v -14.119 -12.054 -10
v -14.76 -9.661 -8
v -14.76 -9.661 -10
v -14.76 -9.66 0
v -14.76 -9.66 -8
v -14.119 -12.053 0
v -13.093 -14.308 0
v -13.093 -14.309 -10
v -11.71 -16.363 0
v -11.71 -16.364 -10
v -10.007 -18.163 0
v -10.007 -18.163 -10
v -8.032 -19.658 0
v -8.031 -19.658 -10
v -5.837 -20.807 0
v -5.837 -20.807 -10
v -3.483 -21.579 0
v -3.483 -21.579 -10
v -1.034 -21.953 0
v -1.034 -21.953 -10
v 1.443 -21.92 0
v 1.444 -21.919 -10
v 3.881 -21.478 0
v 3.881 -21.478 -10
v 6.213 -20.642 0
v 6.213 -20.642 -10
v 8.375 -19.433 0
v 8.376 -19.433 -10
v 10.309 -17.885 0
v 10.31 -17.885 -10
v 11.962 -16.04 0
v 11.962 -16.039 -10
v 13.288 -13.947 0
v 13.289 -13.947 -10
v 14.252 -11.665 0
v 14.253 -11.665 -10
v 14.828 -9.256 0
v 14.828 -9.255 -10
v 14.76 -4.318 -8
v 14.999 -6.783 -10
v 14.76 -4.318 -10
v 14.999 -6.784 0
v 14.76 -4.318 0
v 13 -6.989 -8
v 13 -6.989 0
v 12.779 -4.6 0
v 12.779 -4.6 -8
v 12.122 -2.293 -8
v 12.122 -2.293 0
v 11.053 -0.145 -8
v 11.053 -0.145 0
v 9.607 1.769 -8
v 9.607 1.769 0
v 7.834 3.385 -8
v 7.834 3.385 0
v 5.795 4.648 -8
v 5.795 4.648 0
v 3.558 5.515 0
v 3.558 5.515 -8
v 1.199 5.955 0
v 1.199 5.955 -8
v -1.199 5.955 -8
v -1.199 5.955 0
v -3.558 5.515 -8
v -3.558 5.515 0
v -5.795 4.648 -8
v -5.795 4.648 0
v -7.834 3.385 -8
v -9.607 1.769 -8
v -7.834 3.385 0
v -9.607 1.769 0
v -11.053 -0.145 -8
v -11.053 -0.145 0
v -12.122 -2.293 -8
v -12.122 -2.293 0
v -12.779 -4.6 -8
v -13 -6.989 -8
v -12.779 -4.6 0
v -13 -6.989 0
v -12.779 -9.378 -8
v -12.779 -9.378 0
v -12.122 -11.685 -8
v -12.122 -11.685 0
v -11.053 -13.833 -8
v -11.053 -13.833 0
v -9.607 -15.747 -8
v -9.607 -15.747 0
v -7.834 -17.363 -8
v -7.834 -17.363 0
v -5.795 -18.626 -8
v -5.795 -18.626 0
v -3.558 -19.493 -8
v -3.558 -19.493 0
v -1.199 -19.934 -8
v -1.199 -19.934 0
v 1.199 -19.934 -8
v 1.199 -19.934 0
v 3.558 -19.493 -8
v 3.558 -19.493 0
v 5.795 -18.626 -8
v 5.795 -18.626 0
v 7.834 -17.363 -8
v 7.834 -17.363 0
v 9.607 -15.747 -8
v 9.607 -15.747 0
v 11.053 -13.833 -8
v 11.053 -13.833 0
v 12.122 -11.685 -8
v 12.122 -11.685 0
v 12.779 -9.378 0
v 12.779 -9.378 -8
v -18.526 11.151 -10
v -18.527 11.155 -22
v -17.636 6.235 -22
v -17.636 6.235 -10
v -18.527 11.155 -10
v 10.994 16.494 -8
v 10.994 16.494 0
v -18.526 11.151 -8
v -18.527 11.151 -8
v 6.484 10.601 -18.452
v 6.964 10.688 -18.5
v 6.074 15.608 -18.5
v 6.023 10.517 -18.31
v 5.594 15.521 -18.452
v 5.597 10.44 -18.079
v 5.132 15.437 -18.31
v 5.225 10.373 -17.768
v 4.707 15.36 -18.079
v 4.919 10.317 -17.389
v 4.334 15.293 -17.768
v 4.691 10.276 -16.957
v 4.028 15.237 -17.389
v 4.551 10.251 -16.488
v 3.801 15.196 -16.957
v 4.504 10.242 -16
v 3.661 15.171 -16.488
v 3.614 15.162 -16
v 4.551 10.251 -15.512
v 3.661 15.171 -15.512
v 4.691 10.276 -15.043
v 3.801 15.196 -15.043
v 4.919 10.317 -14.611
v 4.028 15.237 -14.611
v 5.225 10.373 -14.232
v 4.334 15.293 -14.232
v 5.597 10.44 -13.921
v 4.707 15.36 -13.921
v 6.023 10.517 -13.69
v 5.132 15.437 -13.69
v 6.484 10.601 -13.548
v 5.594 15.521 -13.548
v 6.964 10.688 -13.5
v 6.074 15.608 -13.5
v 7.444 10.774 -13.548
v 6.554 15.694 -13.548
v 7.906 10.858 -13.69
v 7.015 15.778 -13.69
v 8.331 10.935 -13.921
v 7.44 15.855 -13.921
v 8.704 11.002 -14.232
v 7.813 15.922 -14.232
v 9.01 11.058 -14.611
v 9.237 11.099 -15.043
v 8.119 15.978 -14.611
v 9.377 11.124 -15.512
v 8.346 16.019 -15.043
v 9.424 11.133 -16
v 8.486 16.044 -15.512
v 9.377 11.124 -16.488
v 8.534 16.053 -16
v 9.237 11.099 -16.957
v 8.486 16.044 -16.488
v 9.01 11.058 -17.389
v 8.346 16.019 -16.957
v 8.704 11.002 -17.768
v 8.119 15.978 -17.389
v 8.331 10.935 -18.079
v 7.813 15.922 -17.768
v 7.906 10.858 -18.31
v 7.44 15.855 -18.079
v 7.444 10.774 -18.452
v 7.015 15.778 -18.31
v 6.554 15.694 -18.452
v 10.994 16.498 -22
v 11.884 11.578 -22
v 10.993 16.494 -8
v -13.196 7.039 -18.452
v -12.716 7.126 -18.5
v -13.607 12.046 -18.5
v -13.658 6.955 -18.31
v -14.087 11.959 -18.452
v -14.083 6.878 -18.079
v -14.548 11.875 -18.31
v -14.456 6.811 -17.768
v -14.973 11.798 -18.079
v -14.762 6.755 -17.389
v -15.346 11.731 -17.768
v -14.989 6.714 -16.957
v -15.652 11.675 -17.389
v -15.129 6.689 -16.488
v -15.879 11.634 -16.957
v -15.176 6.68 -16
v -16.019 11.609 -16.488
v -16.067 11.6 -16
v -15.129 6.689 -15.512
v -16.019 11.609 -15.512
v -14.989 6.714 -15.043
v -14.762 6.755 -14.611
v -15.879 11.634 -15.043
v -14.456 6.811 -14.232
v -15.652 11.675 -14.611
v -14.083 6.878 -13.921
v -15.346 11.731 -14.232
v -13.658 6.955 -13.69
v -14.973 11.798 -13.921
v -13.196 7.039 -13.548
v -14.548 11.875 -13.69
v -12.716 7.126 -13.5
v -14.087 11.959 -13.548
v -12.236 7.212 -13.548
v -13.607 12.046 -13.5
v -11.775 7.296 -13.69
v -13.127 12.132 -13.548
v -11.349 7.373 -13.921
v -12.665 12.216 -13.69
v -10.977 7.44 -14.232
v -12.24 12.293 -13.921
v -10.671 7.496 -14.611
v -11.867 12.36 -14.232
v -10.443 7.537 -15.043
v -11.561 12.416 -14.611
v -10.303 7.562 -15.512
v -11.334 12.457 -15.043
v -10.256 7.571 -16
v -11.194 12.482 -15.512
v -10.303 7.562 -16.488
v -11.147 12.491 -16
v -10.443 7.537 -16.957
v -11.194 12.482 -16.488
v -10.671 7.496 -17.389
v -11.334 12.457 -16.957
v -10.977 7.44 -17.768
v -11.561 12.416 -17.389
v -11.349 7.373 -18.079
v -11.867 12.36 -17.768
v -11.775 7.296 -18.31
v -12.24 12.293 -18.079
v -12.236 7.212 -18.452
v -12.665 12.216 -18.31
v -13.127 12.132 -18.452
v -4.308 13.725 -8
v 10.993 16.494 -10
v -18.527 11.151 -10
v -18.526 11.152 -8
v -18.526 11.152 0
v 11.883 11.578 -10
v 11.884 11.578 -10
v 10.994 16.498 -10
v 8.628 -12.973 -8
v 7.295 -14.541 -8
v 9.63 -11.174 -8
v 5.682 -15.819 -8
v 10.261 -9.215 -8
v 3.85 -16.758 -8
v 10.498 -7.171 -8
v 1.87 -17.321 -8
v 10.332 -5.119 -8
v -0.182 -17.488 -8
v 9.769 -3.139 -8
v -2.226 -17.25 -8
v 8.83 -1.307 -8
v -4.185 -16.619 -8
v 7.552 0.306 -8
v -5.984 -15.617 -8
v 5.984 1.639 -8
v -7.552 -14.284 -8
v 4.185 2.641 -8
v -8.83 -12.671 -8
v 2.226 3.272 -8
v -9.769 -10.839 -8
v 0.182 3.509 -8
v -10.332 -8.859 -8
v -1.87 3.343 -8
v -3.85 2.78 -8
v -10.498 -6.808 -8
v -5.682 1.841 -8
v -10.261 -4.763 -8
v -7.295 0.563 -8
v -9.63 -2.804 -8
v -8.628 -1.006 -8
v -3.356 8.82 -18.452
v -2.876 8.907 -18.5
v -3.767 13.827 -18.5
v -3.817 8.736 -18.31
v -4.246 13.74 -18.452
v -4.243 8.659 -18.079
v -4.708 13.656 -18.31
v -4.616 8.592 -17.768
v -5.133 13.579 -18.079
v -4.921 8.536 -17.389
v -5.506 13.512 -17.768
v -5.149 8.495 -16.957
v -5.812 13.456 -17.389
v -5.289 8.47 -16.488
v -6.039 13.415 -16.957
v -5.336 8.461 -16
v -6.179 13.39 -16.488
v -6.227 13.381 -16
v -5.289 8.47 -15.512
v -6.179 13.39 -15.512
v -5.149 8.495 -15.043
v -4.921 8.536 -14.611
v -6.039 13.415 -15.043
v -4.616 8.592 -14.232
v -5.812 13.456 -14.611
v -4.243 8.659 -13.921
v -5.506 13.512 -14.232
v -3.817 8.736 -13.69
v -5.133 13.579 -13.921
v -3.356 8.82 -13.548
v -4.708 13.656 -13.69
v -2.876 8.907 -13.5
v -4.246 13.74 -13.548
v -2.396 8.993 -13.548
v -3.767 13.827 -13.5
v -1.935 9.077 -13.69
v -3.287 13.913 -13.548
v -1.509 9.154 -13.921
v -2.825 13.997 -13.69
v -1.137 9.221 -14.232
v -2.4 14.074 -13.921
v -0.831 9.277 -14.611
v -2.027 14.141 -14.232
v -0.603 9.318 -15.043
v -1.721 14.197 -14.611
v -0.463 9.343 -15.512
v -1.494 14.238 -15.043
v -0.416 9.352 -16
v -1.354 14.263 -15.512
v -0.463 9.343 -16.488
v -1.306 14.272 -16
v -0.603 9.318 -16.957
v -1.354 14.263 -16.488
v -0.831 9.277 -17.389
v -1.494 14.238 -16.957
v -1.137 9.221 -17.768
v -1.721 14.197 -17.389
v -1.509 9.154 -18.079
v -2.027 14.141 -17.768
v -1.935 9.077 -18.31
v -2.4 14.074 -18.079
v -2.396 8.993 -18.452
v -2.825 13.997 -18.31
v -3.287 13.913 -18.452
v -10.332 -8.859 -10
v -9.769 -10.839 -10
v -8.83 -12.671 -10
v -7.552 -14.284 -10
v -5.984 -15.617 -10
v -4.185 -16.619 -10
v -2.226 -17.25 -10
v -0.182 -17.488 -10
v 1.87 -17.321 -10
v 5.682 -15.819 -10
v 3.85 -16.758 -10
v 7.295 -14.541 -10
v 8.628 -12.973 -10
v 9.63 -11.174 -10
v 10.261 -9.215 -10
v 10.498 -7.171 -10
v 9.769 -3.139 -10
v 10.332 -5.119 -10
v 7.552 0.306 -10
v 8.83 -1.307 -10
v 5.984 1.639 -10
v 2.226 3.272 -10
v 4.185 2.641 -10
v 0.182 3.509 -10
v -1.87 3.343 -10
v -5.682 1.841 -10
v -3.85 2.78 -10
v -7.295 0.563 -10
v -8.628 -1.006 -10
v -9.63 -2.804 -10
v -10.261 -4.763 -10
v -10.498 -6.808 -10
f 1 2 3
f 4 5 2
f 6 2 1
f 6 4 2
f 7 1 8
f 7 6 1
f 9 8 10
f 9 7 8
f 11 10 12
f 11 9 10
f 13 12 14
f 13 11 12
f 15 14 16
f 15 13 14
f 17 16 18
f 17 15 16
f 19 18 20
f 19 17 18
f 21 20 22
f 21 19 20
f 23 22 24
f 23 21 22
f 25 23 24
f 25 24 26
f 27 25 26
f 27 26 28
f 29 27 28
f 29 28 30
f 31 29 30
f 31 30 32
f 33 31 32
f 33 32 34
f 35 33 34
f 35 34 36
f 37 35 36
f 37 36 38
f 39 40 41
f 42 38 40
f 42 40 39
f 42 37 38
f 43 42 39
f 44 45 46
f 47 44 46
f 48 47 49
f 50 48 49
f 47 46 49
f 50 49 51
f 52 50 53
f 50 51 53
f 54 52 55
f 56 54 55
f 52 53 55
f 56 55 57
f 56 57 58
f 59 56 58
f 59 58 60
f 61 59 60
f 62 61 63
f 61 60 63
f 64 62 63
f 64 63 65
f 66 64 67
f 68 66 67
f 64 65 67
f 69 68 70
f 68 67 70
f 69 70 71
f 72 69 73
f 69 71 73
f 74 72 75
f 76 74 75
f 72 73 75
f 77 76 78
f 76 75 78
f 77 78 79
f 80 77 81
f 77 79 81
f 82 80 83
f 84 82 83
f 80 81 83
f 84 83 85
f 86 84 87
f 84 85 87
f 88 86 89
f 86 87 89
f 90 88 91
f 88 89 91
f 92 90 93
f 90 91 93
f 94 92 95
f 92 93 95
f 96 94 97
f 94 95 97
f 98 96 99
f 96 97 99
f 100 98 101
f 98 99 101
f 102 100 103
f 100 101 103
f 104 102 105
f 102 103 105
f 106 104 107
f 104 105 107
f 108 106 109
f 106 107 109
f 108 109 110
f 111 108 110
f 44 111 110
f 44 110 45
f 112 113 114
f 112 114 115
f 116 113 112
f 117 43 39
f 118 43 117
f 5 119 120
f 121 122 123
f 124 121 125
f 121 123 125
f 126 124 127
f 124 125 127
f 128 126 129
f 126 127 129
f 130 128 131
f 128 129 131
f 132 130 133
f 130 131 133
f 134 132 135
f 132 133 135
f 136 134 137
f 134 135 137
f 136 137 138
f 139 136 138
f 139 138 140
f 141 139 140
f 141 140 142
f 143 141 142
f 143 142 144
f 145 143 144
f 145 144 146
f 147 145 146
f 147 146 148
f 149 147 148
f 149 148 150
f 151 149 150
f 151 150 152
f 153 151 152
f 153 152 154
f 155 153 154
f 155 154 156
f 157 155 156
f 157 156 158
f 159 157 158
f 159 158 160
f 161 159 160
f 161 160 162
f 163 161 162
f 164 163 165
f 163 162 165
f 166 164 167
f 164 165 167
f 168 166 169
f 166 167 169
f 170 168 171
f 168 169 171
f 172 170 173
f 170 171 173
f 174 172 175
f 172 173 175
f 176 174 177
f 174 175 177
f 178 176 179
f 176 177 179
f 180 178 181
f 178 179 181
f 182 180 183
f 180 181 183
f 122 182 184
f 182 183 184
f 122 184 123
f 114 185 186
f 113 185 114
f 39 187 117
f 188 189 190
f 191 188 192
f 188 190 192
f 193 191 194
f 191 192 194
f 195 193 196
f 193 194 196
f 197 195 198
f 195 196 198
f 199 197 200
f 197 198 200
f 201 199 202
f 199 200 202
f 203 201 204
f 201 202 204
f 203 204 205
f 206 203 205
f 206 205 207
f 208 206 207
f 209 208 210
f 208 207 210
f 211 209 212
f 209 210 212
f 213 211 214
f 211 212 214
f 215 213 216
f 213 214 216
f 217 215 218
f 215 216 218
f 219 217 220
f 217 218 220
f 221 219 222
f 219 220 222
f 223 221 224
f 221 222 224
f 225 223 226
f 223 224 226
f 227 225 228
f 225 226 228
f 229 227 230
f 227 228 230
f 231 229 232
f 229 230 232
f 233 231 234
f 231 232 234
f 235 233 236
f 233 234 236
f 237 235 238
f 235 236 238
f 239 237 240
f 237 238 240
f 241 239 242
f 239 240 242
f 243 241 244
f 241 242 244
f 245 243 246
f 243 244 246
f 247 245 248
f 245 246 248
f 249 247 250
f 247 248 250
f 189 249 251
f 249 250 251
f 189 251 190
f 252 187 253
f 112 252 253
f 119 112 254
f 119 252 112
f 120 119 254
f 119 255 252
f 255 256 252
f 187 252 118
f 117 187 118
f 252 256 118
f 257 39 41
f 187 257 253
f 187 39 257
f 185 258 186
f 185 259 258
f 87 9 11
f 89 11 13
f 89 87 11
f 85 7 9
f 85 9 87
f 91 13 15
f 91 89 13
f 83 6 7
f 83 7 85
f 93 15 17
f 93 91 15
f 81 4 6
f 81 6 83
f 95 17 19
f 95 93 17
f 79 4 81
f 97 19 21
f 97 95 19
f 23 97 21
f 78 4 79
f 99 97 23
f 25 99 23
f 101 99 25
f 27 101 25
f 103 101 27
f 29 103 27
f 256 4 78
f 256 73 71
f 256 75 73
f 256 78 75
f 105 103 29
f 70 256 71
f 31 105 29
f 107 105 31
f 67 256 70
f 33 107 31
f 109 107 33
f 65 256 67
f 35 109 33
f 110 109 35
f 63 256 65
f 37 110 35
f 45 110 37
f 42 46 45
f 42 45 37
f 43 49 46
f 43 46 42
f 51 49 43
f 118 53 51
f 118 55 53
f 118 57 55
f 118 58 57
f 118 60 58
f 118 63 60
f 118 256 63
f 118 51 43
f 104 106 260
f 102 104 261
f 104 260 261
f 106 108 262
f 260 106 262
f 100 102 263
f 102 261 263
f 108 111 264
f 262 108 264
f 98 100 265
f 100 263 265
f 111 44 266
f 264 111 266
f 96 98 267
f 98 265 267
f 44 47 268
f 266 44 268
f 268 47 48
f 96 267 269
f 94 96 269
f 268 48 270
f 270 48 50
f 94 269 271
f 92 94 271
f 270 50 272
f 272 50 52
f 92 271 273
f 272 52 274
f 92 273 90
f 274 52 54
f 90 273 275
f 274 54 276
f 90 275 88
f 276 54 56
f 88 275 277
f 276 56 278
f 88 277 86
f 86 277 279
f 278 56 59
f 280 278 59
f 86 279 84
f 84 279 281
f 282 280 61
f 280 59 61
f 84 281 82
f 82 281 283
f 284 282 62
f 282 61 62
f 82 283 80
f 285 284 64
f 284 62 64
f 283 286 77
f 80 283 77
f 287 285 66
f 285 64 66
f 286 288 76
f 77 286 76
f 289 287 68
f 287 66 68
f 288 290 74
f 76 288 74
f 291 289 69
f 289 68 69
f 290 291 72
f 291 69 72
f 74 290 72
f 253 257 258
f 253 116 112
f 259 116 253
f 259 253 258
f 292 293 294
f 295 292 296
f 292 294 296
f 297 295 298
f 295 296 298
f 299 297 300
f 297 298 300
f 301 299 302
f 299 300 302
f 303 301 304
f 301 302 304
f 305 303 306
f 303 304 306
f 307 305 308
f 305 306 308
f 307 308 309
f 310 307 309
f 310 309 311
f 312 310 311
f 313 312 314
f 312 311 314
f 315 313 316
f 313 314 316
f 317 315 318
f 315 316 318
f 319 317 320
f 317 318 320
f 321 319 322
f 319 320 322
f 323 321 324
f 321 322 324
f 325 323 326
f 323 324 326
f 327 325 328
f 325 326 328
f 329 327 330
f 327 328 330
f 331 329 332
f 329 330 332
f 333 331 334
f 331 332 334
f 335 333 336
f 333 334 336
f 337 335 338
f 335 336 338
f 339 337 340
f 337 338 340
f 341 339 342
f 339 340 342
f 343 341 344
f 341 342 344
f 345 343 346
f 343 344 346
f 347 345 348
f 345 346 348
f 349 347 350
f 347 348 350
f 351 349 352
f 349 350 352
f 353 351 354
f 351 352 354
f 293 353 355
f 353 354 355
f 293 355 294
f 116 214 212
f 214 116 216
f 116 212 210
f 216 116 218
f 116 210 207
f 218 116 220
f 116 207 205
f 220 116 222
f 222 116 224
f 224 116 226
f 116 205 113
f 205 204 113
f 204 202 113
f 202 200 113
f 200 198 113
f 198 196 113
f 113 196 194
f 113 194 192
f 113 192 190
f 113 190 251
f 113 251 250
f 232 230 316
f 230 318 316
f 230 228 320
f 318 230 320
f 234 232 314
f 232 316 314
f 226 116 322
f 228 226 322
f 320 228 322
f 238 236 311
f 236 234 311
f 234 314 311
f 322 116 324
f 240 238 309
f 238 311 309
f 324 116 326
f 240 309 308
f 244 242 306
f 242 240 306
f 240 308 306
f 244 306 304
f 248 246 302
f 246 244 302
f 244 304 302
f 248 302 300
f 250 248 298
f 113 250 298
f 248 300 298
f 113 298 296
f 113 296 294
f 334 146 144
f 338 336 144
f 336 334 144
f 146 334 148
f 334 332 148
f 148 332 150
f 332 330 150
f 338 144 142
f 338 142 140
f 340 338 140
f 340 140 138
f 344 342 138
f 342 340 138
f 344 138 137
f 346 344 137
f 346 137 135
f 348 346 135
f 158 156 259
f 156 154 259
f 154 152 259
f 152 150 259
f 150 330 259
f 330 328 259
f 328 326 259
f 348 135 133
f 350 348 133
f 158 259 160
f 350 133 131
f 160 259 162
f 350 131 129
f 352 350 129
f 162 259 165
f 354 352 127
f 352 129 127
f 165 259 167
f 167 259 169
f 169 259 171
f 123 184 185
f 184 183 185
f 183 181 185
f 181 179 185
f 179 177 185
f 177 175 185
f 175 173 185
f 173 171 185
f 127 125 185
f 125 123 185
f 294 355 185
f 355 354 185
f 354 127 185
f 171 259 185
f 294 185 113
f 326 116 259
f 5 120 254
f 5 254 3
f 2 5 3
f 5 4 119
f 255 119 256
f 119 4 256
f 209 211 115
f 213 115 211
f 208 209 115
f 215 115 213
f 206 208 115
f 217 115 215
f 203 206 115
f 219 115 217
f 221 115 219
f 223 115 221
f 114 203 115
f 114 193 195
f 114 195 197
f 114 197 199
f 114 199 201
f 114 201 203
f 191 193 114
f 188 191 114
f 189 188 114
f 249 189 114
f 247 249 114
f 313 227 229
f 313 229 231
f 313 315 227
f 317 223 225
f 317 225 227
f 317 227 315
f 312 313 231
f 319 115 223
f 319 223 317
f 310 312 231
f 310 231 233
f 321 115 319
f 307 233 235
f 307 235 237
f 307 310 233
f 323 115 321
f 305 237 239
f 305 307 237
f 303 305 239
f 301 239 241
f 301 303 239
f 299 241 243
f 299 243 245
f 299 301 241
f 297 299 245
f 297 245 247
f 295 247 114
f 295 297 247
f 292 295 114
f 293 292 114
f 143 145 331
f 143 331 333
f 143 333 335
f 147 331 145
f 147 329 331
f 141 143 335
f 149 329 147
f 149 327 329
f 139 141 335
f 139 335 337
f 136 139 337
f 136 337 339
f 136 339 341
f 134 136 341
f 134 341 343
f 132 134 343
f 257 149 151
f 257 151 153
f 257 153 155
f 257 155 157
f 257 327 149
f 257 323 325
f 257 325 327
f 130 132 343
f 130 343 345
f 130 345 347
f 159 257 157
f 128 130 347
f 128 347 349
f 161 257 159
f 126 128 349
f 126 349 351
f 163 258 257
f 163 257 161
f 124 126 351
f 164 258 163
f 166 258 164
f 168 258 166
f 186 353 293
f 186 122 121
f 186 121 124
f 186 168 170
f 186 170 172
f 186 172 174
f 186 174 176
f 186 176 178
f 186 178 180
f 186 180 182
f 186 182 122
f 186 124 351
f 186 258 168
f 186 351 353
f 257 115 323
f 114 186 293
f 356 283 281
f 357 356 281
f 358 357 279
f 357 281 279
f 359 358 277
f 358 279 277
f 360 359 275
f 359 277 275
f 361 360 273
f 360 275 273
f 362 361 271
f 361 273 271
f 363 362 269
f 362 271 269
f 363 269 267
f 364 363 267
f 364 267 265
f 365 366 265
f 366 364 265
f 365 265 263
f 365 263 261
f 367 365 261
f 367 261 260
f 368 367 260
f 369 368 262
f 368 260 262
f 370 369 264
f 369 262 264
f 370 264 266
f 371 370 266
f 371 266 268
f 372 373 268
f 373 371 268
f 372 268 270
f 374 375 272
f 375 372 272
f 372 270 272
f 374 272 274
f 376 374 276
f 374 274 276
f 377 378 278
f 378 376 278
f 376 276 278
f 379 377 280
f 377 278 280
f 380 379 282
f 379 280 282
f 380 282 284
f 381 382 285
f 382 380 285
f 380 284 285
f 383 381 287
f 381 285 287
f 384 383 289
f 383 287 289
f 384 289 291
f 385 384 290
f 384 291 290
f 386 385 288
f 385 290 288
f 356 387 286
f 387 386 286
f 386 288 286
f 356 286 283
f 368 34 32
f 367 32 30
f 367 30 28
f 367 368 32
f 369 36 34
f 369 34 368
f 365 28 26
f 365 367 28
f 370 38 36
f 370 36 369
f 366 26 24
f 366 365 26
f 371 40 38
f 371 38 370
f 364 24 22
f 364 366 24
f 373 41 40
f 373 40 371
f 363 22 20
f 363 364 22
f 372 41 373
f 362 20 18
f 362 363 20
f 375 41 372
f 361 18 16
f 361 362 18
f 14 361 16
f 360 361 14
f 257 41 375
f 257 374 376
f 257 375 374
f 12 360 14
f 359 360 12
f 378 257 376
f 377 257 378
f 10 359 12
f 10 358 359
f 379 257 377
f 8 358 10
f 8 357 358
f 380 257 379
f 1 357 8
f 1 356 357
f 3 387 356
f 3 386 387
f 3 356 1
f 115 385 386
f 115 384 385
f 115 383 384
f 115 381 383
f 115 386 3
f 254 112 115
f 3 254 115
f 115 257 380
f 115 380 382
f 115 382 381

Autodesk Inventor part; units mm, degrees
ref_plane "YZ Plane" through (0, 0, 0) normal (1, 0, 0) x (0, 1, 0)
ref_plane "XZ Plane" through (0, 0, 0) normal (0, 1, 0) x (-1, 0, 0)
sketch "Sketch1" plane through (0, 0, 0) normal (0, 0, 1) x (1, 0, 0)
  circle A0 centre (0, -6.9891) radius 13 projected
  line L0 (-8.3396, 25.9015) -> (-6.0783, 13.4045)
  line L1 (9.8647, 29.1956) -> (12.126, 16.6985) projected
  line L2 (-201.5028, -9.0509) -> (9.8647, 29.1956) projected
  line L3 (-199.2415, -21.5479) -> (-201.5028, -9.0509) projected
  line L4 (-199.2415, -21.5479) -> (12.126, 16.6985) projected
  line L5 (0, -6.9891) -> (-3.7659, 13.8229) construction
  circle A1 centre (0, -6.9891) radius 15
  line L6 (0, -6.9891) -> (-14.7603, -9.66) construction
  line L7 (-14.7603, -9.66) -> (-18.5262, 11.1521)
  line L8 (0, -6.9891) -> (14.7603, -4.3183) construction
  line L9 (14.7603, -4.3183) -> (10.9944, 16.4937)
  line L10 (10.9944, 16.4937) -> (-18.5262, 11.1521)
  point P0 (0, 0)
ref_plane "Work Plane1" through (-17.5555, -24.5446, -8) normal (0, 0, -1) x (0, 1, 0)
extrude "Extrusion1" add sketch "Sketch1" against normal up to surface (8 mm away) contours L4 L9 A1 L7 | A1
sketch "Sketch2" plane through (0, -6.9891, -8) normal (0, 0, -1) x (-0.984, -0.1781, 0)
  circle A0 centre (0, 0) radius 13 projected
  line L0 (15, 21.15) -> (15, 0) projected
  line L1 (-15, 21.15) -> (15, 21.15) projected
  line L2 (-15, 0) -> (-15, 21.15) projected
  arc A1 (-15, 0) -> (15, 0) centre (0, 0) ccw projected
  circle A2 centre (0, 0) radius 5 projected
  circle A3 centre (0, 0) radius 10.5
  point P0 (-1.2445, 6.8774)
extrude "Extrusion2" add sketch "Sketch2" along normal blind 2 contours A0 | L0 A1 L2 L1
ref_plane "Work Plane2" through (-83.7175, -0.6442, 79.375) normal (0.1781, -0.984, 0) x (0, 0, -1)
sketch "Sketch3" plane through (-83.7175, -0.6442, 79.375) normal (0.1781, -0.984, 0) x (0, 0, -1)
  circle A0 centre (-108.5, -103.9) radius 5 projected
  circle A1 centre (108.5, -103.9) radius 5 projected
  circle A2 centre (-108.5, 83.9) radius 5 projected
  circle A3 centre (108.5, 83.9) radius 5 projected
  arc A4 (127, 97.4) -> (122, 102.4) centre (122, 97.4) ccw projected
  line L0 (84.375, 102.4) -> (122, 102.4) projected
  arc A5 (84.375, 102.4) -> (79.375, 97.4) centre (84.375, 97.4) ccw projected
  line L1 (79.375, 97.4) -> (79.375, 2.8) projected
  line L2 (-79.375, 2.8) -> (-79.375, 97.4) projected
  arc A6 (-79.375, 97.4) -> (-84.375, 102.4) centre (-84.375, 97.4) ccw projected
  line L3 (-122, 102.4) -> (-84.375, 102.4) projected
  arc A7 (-122, 102.4) -> (-127, 97.4) centre (-122, 97.4) ccw projected
  line L4 (-127, -117.4) -> (-127, 97.4) projected
  arc A8 (-127, -117.4) -> (-122, -122.4) centre (-122, -117.4) ccw projected
  line L5 (-95, -122.4) -> (-122, -122.4) projected
  arc A9 (-95, -122.4) -> (-90, -117.4) centre (-95, -117.4) ccw projected
  line L6 (-90, -117.4) -> (-90, -47.4) projected
  arc A10 (-85, -42.4) -> (-90, -47.4) centre (-85, -47.4) ccw projected
  line L7 (-85, -42.4) -> (85, -42.4) projected
  arc A11 (90, -47.4) -> (85, -42.4) centre (85, -47.4) ccw projected
  line L8 (90, -47.4) -> (90, -117.4) projected
  arc A12 (90, -117.4) -> (95, -122.4) centre (95, -117.4) ccw projected
  line L9 (122, -122.4) -> (95, -122.4) projected
  arc A13 (122, -122.4) -> (127, -117.4) centre (122, -117.4) ccw projected
  line L10 (127, 97.4) -> (127, -117.4) projected
  line L11 (89.375, 66.25) -> (89.375, 96.25) projected
  line L12 (89.375, 96.25) -> (101.375, 96.25)
  line L13 (101.375, 96.25) -> (101.375, 66.25)
  line L14 (101.375, 66.25) -> (89.375, 66.25)
  line L15 (89.375, 66.25) -> (89.375, 96.25)
  circle A14 centre (95.375, 81.25) radius 2.5
  line L16 (95.375, 96.25) -> (95.375, 66.25)
  circle A15 centre (95.375, 71.25) radius 2.5
  circle A16 centre (95.375, 91.25) radius 2.5
  circle A17 centre (95.375, 81.25) radius 2.5
  line L17 (79.375, 66.25) -> (89.375, 66.25) projected
  arc A18 (77.375, 0.8) -> (79.375, 2.8) centre (77.375, 2.8) ccw projected
  line L18 (77.375, 0.8) -> (-77.375, 0.8) projected
  arc A19 (-79.375, 2.8) -> (-77.375, 0.8) centre (-77.375, 2.8) ccw projected
  point P0 (79.375, 82.4945)
  dimension "d5" = 12
  dimension "d6" = 5
  dimension "d9" = 10
  dimension "d12" = 10
extrude "Extrusion3" add sketch "Sketch3" along normal blind 5 contours L11 L12 L16 A16 A14 A15 L14 | L16 A15 A14 A16 L12 L13 L14
properties part number "RodBearingMount"
